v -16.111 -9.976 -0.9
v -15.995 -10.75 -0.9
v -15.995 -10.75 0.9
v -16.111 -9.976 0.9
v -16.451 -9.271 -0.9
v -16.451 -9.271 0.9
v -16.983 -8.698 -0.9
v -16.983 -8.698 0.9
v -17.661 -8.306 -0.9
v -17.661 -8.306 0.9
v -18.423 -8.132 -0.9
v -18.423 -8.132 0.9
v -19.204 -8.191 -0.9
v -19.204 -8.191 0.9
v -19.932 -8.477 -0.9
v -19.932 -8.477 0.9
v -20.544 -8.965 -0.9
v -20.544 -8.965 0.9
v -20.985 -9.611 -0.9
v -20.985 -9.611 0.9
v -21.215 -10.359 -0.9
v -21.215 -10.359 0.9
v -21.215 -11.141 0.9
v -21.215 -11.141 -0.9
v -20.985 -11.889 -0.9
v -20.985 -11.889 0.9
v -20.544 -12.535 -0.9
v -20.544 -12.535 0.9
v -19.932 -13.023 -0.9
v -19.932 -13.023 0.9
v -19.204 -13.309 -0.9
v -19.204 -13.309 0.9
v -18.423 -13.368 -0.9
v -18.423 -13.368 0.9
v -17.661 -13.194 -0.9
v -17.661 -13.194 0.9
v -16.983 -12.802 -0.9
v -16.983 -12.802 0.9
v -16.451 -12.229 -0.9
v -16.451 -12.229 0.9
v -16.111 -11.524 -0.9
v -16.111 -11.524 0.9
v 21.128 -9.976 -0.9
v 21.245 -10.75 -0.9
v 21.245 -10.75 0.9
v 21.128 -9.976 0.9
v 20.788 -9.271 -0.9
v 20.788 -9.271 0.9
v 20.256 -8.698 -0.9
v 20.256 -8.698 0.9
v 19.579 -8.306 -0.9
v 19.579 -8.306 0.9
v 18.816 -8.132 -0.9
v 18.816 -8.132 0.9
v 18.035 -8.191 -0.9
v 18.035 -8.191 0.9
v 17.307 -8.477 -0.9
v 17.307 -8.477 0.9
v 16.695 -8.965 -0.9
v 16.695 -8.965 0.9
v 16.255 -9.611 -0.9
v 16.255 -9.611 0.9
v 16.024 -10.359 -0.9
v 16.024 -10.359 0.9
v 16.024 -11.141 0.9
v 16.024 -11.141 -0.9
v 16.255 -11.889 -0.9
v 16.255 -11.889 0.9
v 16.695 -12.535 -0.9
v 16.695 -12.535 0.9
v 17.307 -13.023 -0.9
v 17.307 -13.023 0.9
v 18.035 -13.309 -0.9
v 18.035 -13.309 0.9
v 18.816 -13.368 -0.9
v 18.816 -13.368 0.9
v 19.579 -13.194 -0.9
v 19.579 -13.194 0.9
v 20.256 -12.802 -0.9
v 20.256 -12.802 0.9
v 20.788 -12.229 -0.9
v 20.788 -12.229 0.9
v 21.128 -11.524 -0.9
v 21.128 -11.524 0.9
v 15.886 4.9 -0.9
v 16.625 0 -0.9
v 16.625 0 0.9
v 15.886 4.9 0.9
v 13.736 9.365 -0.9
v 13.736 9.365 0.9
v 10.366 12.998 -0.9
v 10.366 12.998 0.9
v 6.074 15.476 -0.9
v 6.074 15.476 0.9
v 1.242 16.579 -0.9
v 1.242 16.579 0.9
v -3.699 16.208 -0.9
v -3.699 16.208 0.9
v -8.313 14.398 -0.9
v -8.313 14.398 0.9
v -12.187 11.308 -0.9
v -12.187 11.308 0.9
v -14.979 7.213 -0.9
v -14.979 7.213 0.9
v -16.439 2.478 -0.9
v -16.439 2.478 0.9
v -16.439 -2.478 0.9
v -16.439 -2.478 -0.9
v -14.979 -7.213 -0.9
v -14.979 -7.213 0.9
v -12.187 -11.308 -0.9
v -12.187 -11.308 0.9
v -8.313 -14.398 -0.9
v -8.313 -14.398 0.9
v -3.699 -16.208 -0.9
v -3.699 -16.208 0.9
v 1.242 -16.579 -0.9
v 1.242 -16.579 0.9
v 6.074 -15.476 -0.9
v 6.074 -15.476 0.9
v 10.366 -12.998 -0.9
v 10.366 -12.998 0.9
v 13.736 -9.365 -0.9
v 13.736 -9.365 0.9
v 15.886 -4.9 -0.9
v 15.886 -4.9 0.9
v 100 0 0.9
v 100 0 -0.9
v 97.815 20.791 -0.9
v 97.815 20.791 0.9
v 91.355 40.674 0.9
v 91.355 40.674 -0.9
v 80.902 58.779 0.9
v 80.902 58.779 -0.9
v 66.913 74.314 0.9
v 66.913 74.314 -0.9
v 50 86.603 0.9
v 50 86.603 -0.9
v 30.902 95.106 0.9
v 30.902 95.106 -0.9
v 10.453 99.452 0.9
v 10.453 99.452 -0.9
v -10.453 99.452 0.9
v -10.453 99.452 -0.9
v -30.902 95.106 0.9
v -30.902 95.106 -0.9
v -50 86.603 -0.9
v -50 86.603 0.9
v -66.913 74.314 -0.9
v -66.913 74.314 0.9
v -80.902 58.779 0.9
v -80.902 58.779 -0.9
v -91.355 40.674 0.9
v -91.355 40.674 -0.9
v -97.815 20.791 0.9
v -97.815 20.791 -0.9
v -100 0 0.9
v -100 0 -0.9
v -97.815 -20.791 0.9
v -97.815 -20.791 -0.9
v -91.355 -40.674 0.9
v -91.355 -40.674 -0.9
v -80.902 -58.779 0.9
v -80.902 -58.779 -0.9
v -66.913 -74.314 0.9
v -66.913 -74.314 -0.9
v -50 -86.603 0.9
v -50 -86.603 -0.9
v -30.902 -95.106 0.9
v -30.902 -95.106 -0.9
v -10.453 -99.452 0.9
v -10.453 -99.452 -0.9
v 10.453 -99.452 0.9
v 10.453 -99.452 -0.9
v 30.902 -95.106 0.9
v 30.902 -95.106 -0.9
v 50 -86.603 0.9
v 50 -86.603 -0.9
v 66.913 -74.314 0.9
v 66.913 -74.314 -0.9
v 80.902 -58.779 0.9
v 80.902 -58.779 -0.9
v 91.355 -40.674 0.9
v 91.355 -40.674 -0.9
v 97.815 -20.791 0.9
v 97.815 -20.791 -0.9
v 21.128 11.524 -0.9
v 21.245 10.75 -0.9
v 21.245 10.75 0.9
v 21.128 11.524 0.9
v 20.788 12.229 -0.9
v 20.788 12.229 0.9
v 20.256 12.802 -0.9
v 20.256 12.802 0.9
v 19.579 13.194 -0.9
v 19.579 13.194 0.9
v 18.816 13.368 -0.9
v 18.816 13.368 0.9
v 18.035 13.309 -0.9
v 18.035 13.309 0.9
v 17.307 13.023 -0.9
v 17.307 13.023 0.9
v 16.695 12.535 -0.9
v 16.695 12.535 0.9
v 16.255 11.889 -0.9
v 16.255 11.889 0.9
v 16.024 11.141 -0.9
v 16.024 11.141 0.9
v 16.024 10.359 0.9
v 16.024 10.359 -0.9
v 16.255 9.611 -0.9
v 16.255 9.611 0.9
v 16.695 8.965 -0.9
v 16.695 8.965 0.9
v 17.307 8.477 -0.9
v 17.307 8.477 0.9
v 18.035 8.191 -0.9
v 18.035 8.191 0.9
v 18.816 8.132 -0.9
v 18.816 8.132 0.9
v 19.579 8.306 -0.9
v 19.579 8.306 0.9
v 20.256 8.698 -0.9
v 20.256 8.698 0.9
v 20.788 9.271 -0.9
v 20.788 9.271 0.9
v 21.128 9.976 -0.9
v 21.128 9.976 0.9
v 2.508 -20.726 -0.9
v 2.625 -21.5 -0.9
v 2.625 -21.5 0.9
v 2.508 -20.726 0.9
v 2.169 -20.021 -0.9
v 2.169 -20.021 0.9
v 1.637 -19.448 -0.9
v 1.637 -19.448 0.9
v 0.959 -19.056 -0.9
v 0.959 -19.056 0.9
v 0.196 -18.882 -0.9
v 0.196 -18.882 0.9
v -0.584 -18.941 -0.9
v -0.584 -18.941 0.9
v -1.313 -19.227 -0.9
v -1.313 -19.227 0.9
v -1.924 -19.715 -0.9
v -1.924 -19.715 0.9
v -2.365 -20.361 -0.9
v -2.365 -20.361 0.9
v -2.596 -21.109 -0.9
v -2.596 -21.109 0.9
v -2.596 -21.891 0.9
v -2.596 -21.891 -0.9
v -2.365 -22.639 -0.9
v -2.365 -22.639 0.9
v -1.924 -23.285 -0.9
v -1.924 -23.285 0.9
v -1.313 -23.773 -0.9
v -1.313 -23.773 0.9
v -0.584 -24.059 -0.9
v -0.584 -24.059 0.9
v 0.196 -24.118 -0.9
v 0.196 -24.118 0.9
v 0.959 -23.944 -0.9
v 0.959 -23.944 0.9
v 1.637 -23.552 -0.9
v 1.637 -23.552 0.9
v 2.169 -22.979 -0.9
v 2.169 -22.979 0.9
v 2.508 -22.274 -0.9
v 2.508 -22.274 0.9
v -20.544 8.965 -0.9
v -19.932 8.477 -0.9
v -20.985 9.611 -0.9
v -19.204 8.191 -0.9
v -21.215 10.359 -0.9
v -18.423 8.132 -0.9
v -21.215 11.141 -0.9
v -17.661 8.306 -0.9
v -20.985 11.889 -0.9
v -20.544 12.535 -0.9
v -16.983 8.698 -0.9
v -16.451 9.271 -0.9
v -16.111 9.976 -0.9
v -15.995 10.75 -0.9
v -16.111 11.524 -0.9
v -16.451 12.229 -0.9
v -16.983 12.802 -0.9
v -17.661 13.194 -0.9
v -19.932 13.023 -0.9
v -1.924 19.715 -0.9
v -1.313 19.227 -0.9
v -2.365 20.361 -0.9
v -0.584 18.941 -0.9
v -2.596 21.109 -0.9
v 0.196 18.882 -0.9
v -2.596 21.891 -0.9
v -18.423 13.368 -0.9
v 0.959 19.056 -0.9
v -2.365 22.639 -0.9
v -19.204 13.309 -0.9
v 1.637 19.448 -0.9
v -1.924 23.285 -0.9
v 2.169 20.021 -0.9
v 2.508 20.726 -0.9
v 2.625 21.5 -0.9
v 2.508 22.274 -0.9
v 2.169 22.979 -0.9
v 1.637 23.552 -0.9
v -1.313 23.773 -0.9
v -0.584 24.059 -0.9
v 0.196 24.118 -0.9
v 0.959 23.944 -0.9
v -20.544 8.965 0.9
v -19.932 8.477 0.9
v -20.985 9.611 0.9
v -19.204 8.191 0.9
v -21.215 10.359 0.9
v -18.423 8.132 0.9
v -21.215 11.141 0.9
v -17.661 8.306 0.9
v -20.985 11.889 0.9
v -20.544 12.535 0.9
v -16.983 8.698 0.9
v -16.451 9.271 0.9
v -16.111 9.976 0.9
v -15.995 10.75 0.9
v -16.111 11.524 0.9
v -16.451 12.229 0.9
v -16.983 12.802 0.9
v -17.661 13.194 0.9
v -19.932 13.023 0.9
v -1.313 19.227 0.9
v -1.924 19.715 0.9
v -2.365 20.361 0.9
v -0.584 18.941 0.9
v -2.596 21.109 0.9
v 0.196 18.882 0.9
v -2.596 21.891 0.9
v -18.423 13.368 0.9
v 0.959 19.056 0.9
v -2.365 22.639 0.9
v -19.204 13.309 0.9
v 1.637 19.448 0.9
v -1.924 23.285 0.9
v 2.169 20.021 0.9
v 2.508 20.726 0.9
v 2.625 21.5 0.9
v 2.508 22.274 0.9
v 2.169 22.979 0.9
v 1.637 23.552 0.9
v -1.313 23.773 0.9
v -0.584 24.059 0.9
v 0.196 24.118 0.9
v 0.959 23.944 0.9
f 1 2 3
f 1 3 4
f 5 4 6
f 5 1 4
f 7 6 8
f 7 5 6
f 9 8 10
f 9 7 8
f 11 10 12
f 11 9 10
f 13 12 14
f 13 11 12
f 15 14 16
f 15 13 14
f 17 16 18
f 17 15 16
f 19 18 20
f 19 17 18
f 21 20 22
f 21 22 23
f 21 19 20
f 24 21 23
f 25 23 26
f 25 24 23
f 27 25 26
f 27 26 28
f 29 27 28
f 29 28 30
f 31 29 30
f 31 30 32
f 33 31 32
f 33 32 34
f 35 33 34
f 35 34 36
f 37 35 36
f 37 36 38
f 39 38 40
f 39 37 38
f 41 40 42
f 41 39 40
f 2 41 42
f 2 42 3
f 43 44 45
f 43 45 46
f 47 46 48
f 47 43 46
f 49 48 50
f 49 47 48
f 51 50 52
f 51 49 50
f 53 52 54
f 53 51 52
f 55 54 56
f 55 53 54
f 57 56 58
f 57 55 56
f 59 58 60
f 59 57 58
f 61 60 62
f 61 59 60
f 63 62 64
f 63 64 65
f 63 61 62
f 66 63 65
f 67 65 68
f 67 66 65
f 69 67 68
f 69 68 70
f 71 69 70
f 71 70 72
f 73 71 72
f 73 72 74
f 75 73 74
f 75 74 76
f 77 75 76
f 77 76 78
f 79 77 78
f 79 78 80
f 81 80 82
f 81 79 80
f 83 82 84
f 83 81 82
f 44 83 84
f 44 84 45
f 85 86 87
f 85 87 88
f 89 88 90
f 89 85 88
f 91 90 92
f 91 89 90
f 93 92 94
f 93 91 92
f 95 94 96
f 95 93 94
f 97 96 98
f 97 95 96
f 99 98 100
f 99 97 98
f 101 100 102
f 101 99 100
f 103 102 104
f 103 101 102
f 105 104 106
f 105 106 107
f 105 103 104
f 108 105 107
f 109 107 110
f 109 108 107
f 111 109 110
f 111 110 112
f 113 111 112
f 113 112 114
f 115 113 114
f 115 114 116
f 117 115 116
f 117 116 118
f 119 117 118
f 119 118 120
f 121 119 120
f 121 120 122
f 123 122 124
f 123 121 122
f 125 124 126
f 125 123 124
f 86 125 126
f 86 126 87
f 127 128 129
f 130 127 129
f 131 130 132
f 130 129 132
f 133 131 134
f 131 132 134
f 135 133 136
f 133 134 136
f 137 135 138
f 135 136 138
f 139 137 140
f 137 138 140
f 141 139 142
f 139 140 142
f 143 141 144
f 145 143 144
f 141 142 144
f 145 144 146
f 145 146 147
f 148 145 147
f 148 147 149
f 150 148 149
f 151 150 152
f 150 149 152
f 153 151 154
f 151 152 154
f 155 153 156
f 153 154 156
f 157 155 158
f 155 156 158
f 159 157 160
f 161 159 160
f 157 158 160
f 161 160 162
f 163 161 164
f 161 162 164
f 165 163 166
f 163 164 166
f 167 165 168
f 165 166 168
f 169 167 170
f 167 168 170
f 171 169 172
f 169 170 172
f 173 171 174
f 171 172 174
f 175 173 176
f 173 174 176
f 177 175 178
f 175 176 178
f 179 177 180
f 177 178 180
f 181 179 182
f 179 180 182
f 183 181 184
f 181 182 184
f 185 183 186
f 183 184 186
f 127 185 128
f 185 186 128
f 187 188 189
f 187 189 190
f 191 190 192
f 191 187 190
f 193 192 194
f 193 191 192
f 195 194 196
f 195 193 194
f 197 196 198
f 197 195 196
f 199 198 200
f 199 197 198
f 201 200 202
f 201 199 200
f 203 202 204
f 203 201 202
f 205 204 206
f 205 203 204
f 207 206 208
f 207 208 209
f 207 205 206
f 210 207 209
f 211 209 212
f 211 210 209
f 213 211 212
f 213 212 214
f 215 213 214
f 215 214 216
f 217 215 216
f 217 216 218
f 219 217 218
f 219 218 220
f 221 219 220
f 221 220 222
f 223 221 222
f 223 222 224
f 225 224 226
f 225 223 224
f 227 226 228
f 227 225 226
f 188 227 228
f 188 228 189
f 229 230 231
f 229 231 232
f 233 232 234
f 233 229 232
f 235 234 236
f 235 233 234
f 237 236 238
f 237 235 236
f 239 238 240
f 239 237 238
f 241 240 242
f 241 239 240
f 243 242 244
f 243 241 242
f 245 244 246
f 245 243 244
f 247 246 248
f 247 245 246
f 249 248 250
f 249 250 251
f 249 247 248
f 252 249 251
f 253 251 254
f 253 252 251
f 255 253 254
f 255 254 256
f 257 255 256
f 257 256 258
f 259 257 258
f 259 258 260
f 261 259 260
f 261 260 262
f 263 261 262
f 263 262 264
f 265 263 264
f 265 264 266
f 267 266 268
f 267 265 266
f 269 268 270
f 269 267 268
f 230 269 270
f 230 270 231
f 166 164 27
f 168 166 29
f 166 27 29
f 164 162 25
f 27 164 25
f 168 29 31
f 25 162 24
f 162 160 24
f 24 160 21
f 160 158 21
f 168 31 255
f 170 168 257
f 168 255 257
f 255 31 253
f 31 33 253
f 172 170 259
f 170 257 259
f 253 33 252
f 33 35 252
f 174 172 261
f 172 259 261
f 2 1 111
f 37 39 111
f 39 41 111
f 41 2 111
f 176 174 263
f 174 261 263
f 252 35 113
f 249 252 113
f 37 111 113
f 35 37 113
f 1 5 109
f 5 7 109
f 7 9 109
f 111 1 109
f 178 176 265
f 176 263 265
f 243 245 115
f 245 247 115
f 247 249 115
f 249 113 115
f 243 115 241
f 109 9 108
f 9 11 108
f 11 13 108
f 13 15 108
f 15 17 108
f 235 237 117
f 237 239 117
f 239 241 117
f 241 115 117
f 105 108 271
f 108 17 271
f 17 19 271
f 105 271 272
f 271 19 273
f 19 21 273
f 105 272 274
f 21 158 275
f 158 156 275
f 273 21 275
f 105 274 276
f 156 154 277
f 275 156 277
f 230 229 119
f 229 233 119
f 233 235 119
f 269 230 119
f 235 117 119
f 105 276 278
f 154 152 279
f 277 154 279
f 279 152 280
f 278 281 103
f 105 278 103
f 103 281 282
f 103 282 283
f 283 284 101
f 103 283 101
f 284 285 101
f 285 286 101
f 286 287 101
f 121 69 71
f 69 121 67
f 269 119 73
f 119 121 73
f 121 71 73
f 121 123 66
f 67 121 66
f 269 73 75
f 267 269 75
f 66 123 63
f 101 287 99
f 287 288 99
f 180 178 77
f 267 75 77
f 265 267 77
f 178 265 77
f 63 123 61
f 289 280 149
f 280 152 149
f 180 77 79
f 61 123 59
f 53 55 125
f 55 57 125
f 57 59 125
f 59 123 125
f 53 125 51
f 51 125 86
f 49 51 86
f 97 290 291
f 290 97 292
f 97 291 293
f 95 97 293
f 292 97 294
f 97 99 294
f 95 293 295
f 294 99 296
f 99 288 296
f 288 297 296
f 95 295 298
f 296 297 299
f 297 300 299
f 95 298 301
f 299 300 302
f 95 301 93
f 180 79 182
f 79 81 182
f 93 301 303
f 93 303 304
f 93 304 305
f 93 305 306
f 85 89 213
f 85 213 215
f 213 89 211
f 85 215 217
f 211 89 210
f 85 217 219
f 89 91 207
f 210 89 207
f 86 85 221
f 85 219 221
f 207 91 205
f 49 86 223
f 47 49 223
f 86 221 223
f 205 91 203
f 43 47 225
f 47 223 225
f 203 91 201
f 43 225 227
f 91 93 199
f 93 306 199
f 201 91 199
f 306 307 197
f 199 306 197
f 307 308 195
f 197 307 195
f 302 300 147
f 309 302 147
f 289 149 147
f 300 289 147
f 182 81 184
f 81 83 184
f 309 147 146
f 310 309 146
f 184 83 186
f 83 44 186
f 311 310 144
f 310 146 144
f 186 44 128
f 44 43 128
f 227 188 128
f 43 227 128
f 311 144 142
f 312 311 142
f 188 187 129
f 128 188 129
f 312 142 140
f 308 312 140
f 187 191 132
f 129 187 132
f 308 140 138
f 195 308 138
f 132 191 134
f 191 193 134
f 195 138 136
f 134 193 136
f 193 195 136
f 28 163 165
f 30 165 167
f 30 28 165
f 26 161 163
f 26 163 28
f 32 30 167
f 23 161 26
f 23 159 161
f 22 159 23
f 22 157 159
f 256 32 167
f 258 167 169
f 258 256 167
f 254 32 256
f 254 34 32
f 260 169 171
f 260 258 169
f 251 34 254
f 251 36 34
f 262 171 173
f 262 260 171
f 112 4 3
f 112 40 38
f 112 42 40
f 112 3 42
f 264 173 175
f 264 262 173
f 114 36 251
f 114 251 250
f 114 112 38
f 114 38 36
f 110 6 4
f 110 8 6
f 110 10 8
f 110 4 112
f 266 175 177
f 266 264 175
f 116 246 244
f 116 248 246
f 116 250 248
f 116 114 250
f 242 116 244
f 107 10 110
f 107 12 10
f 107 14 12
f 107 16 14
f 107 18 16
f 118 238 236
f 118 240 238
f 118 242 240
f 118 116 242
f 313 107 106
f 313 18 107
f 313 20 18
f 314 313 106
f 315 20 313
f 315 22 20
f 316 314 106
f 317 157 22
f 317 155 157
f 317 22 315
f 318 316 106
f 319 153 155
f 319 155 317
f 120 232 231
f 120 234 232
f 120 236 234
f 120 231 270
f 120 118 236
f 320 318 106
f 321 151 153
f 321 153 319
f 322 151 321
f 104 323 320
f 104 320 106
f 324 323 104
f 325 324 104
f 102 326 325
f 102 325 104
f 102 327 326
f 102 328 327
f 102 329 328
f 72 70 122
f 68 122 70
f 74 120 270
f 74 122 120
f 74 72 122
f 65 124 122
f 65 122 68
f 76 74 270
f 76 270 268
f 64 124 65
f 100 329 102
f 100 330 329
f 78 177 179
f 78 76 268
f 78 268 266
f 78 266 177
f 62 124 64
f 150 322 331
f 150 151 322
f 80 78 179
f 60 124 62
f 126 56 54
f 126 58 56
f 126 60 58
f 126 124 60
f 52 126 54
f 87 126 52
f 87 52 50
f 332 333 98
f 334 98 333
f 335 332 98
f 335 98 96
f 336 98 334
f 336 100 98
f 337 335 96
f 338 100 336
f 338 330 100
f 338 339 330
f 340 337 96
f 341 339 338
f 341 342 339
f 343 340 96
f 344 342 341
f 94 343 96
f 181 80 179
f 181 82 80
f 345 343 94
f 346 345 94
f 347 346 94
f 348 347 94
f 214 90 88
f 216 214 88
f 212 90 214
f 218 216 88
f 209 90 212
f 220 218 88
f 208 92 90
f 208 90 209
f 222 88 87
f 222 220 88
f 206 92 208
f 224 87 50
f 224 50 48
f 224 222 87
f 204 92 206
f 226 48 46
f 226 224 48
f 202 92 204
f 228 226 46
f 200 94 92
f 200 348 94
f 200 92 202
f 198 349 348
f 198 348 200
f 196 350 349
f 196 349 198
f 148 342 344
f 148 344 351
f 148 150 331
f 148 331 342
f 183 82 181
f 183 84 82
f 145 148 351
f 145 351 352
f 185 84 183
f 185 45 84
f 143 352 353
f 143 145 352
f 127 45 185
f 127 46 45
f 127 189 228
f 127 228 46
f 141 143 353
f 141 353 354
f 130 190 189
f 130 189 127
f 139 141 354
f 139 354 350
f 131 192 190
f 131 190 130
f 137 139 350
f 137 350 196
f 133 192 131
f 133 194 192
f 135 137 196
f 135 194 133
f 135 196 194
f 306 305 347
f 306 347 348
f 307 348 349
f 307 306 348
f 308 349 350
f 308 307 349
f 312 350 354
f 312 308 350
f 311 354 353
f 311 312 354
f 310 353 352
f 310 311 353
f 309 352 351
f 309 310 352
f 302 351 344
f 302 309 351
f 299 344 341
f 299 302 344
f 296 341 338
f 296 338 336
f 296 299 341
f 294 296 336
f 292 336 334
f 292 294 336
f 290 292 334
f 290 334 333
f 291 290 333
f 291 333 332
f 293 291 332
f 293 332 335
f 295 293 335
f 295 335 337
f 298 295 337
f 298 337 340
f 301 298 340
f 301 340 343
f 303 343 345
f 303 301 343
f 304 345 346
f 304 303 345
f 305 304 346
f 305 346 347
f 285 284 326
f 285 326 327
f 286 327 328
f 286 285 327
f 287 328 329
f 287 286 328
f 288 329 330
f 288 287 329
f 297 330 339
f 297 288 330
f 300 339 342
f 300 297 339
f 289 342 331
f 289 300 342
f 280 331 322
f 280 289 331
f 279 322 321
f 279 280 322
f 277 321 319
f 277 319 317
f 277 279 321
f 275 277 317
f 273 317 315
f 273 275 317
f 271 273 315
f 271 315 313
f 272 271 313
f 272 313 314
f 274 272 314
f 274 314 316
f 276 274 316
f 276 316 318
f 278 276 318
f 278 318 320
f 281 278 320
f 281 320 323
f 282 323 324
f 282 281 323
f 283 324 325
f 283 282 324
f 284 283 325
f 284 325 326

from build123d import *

# Parameters (mm, degrees)
BOSS_EXTRUDE1_DEPTH      = 0.9
BOSS_EXTRUDE1_DEPTH_BACK = 0.9
SKETCH1_R                = 100
SKETCH1_R_2              = 16.625
SKETCH1_R_3              = 2.625


with BuildPart() as part:
    # Sketch1 → Boss-Extrude1 (new, two sides: drawn at the far end of the back side and taken through both)
    with BuildSketch(Plane.XY.offset(-BOSS_EXTRUDE1_DEPTH_BACK)):
        Circle(SKETCH1_R)
        Circle(SKETCH1_R_2, mode=Mode.SUBTRACT)
        with Locations((0, 21.5)):
            Circle(SKETCH1_R_3, mode=Mode.SUBTRACT)
        with Locations((18.619546181, 10.75)):
            Circle(SKETCH1_R_3, mode=Mode.SUBTRACT)
        with Locations((18.619546181, -10.75)):
            Circle(SKETCH1_R_3, mode=Mode.SUBTRACT)
        with Locations((0, -21.5)):
            Circle(SKETCH1_R_3, mode=Mode.SUBTRACT)
        with Locations((-18.619546181, -10.75)):
            Circle(SKETCH1_R_3, mode=Mode.SUBTRACT)
        with Locations((-18.619546181, 10.75)):
            Circle(SKETCH1_R_3, mode=Mode.SUBTRACT)
    extrude(amount=BOSS_EXTRUDE1_DEPTH + BOSS_EXTRUDE1_DEPTH_BACK)


solid = part.part
